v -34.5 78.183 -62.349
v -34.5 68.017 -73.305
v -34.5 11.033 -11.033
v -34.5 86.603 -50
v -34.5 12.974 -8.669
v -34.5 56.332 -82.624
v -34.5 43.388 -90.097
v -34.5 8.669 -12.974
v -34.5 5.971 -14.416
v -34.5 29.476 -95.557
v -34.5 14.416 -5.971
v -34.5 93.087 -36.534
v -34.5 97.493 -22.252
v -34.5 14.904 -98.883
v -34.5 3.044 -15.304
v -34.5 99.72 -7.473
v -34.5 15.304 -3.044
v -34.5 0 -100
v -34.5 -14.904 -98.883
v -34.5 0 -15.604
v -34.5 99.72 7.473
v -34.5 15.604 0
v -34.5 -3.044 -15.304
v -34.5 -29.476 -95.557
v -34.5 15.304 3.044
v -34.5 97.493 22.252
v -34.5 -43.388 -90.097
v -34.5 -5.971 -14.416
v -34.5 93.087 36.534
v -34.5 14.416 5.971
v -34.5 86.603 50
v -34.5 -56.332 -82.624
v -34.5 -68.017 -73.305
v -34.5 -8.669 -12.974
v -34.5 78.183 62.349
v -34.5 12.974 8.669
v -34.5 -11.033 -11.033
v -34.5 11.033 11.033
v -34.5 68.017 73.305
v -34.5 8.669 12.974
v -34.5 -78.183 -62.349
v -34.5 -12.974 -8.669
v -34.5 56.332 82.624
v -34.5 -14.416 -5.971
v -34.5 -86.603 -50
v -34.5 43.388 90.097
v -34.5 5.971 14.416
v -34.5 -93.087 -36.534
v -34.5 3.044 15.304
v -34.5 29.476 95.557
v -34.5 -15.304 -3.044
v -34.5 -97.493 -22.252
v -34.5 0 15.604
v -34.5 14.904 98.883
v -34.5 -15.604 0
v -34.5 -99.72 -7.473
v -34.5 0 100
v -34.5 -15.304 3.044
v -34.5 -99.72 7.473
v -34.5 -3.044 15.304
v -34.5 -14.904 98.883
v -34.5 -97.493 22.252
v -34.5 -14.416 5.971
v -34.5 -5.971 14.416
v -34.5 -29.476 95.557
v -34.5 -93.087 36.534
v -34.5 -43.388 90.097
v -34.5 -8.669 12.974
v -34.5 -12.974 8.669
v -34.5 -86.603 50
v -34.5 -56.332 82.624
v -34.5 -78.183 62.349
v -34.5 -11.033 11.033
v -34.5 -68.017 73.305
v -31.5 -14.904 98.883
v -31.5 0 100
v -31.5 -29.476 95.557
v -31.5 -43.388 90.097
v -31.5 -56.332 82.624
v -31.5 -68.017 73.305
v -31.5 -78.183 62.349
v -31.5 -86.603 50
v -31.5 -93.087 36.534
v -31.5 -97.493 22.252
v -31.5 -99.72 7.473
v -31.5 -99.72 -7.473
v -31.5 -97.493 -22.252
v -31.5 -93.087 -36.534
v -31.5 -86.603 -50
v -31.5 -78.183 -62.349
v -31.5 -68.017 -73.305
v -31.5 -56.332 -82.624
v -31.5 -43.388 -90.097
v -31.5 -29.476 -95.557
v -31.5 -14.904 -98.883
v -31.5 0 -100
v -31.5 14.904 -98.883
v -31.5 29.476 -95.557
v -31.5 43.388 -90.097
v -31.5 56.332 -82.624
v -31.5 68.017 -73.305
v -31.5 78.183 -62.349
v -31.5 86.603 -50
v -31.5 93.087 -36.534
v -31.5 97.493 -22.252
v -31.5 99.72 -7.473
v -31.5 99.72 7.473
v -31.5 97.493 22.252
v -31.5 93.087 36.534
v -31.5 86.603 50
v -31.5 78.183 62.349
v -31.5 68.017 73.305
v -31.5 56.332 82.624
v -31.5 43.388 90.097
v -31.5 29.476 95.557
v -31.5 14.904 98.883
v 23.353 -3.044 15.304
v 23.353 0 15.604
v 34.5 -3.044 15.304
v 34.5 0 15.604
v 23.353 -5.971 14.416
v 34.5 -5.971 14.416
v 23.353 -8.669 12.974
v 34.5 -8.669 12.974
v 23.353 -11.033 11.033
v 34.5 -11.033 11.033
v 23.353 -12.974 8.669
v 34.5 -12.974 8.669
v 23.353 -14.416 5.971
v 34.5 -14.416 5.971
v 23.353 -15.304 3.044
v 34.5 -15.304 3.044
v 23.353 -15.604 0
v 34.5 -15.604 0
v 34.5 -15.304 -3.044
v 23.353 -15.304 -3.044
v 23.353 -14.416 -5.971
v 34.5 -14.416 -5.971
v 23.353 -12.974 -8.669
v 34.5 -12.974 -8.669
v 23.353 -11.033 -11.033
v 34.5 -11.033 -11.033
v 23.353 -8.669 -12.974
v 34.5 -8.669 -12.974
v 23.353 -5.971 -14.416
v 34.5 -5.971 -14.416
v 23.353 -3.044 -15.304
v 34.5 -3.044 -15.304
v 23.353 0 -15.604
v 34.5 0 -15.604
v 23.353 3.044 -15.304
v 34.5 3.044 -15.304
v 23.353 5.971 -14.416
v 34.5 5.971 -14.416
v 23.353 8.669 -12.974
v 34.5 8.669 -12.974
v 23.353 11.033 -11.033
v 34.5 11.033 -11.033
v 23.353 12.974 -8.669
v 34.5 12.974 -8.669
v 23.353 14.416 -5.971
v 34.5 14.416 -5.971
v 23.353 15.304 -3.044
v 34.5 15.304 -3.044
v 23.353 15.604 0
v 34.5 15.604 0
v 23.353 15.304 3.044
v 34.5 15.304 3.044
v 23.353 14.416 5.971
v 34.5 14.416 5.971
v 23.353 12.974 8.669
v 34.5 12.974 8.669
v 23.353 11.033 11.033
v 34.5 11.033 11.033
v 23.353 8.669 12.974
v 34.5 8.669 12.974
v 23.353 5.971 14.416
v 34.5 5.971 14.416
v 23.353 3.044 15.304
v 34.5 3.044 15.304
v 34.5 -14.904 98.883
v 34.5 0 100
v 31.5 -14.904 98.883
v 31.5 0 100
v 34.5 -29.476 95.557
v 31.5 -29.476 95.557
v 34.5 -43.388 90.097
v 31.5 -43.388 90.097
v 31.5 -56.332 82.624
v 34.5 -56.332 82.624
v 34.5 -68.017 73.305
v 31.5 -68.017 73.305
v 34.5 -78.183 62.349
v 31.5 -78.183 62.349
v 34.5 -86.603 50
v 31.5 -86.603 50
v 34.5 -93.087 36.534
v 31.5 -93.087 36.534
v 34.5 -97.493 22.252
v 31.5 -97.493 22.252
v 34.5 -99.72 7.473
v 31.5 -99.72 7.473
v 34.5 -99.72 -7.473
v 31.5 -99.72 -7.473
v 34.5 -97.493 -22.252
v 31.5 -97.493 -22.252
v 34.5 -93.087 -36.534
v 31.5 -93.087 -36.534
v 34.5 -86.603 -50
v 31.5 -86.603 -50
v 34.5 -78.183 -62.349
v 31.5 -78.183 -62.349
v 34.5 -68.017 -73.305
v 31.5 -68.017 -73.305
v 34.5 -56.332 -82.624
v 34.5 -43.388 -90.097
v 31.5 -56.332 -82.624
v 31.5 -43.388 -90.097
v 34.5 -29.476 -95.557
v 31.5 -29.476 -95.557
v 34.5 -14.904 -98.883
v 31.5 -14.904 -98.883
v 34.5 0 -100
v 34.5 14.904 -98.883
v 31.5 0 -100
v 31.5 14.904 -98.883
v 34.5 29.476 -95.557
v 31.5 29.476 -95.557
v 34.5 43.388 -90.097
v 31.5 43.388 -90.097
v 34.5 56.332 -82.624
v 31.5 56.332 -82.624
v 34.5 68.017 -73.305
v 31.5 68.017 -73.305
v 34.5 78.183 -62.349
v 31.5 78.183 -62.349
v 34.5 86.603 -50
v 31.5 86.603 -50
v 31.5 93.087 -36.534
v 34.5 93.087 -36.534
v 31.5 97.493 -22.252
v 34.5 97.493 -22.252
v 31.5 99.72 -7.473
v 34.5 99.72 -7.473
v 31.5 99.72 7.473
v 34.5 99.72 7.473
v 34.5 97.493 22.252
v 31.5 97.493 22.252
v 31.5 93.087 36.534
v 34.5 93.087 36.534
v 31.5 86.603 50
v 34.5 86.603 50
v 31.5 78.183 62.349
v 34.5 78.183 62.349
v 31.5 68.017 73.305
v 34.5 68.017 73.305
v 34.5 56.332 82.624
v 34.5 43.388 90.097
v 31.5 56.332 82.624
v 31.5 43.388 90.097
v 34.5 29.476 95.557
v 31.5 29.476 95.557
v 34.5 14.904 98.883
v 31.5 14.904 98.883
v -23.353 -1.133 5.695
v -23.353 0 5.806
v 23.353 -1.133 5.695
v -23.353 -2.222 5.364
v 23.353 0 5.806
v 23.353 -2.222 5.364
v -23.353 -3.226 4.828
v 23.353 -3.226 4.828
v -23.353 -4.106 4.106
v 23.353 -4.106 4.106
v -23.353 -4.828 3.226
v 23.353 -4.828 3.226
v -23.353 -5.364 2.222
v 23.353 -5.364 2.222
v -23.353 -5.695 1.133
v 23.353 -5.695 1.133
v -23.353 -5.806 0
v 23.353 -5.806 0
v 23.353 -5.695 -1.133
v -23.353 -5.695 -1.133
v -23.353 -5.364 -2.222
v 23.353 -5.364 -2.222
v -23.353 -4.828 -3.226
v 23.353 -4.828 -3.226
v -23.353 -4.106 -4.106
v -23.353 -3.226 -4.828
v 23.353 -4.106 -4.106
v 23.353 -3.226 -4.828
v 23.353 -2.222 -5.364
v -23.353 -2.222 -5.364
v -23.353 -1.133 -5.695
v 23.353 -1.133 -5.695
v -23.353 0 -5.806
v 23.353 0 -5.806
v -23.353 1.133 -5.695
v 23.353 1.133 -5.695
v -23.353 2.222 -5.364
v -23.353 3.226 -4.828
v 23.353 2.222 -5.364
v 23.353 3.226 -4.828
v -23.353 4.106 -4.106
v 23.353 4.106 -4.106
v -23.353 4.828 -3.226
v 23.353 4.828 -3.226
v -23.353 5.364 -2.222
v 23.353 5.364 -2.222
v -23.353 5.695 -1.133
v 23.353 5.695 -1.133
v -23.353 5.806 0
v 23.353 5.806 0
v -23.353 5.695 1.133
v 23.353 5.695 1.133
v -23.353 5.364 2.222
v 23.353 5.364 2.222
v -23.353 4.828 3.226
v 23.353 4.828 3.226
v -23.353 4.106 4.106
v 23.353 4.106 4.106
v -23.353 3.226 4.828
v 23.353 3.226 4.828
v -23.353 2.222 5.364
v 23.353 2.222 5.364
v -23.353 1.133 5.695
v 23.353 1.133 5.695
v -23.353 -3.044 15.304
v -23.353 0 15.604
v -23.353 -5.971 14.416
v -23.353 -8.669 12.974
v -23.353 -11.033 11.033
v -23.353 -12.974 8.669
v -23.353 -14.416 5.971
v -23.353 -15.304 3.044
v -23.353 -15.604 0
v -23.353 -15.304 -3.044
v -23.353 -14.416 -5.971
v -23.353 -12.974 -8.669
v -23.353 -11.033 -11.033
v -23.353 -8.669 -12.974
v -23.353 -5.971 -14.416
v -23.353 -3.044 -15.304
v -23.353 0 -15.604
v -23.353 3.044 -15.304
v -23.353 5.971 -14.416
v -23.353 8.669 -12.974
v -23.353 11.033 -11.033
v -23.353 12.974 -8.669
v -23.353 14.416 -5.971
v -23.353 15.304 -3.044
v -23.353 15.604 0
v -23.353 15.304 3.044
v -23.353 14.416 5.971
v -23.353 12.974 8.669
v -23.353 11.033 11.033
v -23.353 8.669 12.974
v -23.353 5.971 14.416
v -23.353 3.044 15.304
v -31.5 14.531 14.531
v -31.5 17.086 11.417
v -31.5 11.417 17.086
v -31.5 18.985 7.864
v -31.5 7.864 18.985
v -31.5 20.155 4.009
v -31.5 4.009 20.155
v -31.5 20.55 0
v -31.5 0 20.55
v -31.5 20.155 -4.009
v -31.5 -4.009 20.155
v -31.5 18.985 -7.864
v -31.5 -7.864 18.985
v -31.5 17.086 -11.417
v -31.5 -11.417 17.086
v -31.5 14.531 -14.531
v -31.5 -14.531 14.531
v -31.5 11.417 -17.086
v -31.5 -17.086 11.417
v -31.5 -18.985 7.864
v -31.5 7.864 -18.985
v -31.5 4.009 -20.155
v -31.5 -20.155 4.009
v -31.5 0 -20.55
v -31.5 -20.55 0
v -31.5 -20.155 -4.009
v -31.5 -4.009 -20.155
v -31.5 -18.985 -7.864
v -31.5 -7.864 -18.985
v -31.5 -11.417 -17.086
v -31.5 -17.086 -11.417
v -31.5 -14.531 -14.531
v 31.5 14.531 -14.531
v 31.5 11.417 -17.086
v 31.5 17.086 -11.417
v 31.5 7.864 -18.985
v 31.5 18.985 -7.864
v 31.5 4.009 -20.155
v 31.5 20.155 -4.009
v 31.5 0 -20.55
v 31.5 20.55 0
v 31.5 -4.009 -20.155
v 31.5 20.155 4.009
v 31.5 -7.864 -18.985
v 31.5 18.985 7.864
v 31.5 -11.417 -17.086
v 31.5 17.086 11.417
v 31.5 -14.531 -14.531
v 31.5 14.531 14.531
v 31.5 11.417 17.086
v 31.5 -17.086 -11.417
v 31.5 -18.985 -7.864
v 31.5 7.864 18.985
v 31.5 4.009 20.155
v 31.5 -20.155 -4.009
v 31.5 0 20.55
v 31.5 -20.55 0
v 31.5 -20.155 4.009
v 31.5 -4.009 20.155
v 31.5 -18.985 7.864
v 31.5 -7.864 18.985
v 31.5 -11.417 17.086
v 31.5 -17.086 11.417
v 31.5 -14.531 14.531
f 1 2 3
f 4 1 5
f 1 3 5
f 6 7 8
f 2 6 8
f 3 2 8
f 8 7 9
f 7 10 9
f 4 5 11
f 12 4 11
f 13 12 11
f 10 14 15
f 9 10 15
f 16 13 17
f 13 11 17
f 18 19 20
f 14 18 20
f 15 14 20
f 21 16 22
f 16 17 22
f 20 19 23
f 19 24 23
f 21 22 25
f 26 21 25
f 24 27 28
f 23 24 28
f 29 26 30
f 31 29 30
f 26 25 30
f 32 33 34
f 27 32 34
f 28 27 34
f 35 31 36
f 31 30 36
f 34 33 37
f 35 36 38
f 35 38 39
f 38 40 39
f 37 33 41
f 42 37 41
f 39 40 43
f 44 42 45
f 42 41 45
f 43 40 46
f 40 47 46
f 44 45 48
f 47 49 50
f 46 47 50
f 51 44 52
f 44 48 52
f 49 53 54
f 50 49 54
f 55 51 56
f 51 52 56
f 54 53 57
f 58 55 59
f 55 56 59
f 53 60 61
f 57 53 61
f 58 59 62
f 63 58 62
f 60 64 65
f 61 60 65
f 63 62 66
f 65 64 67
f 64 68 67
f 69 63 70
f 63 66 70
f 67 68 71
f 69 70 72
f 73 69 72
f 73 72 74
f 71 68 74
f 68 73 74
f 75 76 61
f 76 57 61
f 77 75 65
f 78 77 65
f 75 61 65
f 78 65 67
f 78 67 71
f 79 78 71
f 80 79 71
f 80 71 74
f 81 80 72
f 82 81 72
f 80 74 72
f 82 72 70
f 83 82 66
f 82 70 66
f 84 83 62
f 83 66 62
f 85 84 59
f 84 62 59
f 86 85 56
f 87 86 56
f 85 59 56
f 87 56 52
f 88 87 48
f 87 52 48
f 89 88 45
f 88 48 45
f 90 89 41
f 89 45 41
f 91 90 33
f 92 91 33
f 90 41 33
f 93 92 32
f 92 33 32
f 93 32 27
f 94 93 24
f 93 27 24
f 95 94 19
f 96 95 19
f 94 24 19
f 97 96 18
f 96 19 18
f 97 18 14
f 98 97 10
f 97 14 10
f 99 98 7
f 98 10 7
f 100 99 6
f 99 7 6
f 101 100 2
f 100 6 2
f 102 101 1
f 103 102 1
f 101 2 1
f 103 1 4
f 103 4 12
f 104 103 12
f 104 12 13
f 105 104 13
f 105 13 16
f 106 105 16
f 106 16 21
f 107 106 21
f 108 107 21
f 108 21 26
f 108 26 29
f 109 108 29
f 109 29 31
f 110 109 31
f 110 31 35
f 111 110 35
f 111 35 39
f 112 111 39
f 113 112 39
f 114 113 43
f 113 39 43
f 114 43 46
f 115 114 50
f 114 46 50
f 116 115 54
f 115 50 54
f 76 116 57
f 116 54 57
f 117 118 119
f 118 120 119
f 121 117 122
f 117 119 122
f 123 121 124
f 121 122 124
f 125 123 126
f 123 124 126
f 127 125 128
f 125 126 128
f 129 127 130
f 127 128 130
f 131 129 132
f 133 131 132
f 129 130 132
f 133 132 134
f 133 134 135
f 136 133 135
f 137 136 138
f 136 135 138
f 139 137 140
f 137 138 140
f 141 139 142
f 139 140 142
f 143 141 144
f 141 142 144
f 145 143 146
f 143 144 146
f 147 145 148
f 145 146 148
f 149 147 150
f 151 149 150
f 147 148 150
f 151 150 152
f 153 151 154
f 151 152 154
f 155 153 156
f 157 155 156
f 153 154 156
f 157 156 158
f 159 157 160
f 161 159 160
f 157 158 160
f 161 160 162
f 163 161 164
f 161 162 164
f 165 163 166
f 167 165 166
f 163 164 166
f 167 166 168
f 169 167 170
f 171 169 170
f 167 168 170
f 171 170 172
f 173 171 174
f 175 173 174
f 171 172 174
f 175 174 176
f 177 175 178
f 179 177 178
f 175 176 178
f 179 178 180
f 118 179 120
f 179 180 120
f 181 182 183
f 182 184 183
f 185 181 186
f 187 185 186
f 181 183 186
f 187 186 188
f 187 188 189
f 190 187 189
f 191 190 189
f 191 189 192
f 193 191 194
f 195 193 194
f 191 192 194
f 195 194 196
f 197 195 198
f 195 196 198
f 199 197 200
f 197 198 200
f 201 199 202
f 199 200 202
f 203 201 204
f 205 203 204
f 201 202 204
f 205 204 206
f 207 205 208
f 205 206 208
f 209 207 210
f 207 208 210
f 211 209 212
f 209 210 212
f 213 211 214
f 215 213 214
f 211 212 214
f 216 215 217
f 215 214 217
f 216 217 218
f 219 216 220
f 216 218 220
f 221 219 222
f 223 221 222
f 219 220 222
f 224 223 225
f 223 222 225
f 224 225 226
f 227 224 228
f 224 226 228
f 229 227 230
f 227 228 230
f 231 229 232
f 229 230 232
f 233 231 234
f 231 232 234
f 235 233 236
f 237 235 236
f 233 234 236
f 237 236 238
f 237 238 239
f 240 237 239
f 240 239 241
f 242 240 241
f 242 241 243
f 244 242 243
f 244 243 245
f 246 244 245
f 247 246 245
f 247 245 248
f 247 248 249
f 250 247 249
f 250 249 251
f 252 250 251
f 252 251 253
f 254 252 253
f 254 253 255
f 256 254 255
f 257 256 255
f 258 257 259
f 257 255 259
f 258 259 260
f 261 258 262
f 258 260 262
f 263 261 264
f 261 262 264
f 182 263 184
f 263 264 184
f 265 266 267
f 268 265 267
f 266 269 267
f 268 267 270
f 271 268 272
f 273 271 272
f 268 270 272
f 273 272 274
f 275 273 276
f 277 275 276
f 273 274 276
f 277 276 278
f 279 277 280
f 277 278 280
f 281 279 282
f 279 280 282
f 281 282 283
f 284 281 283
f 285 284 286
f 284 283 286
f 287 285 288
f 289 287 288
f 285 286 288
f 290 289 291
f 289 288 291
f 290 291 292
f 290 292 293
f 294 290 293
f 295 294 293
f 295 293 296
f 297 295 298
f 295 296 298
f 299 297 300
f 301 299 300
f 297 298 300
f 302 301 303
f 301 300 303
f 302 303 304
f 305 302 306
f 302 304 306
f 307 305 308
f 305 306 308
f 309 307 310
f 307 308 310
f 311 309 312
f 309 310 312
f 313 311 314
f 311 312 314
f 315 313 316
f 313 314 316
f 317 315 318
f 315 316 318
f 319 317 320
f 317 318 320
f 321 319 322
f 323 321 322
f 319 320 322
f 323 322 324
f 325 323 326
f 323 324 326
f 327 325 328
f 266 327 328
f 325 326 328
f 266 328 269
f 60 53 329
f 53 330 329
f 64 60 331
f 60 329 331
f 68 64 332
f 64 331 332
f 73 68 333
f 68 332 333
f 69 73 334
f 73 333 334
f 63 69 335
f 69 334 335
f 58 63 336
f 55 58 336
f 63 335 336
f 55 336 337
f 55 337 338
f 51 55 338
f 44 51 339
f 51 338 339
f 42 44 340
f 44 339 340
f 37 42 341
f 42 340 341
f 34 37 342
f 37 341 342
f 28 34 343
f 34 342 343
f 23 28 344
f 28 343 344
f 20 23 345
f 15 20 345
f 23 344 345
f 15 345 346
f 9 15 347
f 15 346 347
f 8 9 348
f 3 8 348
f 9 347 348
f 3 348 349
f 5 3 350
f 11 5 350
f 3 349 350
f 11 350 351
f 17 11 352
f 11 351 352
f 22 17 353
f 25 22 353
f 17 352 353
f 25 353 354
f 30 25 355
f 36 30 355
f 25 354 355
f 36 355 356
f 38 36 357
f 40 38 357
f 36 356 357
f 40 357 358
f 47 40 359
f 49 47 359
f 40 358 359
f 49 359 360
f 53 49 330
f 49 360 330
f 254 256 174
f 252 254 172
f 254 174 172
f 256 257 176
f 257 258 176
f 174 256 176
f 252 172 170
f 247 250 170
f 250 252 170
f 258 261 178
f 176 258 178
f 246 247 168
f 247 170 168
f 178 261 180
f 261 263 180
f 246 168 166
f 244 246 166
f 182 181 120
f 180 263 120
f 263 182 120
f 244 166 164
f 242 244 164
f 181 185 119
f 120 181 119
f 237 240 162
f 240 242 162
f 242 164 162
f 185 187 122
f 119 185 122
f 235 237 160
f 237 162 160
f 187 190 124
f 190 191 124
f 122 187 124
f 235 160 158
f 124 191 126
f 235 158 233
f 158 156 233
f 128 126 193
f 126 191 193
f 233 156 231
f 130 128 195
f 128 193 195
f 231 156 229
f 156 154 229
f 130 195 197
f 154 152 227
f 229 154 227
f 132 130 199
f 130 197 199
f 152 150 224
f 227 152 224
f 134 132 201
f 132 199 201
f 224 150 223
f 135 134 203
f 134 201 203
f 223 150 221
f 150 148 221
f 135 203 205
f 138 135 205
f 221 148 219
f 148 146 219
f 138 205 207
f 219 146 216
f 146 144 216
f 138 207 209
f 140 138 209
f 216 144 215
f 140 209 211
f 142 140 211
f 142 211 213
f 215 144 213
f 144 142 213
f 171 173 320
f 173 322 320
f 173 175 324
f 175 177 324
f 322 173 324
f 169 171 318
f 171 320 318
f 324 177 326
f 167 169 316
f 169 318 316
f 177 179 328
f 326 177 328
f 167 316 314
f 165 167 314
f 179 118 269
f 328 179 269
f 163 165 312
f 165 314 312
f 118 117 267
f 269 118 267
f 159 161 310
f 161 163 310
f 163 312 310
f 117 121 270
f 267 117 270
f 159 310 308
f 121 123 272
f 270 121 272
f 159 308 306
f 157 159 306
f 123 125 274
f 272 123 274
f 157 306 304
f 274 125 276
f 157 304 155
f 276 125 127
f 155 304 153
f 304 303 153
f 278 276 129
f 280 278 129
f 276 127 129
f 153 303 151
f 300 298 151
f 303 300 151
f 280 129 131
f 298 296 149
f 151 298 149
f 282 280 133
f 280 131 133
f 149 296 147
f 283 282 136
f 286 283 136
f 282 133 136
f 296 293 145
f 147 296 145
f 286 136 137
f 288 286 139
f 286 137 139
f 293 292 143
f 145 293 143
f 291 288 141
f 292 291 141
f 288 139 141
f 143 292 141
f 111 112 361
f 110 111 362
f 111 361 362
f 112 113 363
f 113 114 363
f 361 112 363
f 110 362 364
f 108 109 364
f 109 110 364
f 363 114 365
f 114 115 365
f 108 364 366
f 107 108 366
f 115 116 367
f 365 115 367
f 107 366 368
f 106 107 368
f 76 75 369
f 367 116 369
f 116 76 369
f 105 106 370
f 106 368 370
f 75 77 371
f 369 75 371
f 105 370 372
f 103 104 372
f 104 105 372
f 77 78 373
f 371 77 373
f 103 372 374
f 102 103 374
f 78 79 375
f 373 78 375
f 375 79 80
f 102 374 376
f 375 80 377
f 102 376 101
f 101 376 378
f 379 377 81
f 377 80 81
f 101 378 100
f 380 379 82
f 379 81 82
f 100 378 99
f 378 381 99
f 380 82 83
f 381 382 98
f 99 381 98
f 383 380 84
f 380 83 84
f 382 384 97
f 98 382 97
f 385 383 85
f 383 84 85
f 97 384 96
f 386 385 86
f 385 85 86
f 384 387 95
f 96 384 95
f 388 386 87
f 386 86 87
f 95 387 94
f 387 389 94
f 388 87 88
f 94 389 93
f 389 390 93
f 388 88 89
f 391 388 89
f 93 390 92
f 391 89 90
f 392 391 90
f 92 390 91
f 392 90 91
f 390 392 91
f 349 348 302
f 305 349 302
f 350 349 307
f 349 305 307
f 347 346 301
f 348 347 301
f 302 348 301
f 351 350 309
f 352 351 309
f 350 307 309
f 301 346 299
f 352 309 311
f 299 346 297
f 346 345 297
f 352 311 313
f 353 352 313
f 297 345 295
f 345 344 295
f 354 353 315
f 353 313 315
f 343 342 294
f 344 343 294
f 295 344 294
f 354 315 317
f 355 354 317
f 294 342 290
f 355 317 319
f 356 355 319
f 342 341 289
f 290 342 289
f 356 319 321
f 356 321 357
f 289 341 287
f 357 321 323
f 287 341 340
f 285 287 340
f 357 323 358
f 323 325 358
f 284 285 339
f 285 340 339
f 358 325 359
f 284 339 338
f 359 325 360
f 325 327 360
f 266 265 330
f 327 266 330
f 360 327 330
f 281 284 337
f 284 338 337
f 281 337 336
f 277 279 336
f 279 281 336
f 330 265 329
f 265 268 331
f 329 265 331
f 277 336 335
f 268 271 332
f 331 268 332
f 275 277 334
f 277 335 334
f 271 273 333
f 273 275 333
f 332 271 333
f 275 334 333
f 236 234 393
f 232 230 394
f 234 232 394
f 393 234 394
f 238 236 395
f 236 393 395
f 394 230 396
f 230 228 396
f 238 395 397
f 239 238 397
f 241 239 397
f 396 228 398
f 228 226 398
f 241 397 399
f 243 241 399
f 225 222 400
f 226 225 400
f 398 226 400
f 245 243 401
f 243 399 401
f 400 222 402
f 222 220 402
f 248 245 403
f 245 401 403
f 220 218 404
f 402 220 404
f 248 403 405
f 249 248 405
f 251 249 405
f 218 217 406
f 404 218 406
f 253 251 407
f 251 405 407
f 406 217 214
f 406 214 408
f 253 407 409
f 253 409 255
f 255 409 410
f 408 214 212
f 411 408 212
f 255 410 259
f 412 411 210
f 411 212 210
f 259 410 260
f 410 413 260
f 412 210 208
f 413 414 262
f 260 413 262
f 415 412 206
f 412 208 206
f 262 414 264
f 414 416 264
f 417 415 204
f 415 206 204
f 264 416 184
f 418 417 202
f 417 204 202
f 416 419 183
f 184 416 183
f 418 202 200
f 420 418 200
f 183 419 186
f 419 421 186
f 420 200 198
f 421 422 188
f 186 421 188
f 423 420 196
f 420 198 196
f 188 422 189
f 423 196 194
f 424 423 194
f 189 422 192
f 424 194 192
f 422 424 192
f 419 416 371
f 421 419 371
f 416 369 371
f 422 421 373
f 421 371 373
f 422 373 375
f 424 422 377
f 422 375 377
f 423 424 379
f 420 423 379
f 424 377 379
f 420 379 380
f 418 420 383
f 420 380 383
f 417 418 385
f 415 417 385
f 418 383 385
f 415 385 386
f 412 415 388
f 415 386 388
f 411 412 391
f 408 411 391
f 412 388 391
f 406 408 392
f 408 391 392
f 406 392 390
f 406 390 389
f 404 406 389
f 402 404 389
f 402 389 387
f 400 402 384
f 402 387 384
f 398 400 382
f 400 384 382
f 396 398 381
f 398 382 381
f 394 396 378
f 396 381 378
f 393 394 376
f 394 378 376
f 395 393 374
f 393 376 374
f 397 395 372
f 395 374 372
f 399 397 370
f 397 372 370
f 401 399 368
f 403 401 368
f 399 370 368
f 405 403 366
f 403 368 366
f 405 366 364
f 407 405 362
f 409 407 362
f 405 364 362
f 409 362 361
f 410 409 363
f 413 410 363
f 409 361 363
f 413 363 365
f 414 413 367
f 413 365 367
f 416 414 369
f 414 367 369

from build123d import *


with BuildPart() as f1:
    # F0 (on Front) → F1 (revolve)
    with BuildSketch(Plane.XZ):
        Polygon((0, 5.806352), (0, 20.549649), (-31.5, 20.549649), (-31.5, 100), (-34.5, 100), (-34.5, 15.603564), (-23.352671, 15.603564), (-23.352671, 5.806352), align=None)
        Polygon((31.5, 20.549649), (0, 20.549649), (0, 5.806352), (23.352671, 5.806352), (23.352671, 15.603564), (34.5, 15.603564), (34.5, 100), (31.5, 100), align=None)
    revolve(axis=Axis((6.947005, 0, 0), (1, 0, 0)))


solid = f1.part
